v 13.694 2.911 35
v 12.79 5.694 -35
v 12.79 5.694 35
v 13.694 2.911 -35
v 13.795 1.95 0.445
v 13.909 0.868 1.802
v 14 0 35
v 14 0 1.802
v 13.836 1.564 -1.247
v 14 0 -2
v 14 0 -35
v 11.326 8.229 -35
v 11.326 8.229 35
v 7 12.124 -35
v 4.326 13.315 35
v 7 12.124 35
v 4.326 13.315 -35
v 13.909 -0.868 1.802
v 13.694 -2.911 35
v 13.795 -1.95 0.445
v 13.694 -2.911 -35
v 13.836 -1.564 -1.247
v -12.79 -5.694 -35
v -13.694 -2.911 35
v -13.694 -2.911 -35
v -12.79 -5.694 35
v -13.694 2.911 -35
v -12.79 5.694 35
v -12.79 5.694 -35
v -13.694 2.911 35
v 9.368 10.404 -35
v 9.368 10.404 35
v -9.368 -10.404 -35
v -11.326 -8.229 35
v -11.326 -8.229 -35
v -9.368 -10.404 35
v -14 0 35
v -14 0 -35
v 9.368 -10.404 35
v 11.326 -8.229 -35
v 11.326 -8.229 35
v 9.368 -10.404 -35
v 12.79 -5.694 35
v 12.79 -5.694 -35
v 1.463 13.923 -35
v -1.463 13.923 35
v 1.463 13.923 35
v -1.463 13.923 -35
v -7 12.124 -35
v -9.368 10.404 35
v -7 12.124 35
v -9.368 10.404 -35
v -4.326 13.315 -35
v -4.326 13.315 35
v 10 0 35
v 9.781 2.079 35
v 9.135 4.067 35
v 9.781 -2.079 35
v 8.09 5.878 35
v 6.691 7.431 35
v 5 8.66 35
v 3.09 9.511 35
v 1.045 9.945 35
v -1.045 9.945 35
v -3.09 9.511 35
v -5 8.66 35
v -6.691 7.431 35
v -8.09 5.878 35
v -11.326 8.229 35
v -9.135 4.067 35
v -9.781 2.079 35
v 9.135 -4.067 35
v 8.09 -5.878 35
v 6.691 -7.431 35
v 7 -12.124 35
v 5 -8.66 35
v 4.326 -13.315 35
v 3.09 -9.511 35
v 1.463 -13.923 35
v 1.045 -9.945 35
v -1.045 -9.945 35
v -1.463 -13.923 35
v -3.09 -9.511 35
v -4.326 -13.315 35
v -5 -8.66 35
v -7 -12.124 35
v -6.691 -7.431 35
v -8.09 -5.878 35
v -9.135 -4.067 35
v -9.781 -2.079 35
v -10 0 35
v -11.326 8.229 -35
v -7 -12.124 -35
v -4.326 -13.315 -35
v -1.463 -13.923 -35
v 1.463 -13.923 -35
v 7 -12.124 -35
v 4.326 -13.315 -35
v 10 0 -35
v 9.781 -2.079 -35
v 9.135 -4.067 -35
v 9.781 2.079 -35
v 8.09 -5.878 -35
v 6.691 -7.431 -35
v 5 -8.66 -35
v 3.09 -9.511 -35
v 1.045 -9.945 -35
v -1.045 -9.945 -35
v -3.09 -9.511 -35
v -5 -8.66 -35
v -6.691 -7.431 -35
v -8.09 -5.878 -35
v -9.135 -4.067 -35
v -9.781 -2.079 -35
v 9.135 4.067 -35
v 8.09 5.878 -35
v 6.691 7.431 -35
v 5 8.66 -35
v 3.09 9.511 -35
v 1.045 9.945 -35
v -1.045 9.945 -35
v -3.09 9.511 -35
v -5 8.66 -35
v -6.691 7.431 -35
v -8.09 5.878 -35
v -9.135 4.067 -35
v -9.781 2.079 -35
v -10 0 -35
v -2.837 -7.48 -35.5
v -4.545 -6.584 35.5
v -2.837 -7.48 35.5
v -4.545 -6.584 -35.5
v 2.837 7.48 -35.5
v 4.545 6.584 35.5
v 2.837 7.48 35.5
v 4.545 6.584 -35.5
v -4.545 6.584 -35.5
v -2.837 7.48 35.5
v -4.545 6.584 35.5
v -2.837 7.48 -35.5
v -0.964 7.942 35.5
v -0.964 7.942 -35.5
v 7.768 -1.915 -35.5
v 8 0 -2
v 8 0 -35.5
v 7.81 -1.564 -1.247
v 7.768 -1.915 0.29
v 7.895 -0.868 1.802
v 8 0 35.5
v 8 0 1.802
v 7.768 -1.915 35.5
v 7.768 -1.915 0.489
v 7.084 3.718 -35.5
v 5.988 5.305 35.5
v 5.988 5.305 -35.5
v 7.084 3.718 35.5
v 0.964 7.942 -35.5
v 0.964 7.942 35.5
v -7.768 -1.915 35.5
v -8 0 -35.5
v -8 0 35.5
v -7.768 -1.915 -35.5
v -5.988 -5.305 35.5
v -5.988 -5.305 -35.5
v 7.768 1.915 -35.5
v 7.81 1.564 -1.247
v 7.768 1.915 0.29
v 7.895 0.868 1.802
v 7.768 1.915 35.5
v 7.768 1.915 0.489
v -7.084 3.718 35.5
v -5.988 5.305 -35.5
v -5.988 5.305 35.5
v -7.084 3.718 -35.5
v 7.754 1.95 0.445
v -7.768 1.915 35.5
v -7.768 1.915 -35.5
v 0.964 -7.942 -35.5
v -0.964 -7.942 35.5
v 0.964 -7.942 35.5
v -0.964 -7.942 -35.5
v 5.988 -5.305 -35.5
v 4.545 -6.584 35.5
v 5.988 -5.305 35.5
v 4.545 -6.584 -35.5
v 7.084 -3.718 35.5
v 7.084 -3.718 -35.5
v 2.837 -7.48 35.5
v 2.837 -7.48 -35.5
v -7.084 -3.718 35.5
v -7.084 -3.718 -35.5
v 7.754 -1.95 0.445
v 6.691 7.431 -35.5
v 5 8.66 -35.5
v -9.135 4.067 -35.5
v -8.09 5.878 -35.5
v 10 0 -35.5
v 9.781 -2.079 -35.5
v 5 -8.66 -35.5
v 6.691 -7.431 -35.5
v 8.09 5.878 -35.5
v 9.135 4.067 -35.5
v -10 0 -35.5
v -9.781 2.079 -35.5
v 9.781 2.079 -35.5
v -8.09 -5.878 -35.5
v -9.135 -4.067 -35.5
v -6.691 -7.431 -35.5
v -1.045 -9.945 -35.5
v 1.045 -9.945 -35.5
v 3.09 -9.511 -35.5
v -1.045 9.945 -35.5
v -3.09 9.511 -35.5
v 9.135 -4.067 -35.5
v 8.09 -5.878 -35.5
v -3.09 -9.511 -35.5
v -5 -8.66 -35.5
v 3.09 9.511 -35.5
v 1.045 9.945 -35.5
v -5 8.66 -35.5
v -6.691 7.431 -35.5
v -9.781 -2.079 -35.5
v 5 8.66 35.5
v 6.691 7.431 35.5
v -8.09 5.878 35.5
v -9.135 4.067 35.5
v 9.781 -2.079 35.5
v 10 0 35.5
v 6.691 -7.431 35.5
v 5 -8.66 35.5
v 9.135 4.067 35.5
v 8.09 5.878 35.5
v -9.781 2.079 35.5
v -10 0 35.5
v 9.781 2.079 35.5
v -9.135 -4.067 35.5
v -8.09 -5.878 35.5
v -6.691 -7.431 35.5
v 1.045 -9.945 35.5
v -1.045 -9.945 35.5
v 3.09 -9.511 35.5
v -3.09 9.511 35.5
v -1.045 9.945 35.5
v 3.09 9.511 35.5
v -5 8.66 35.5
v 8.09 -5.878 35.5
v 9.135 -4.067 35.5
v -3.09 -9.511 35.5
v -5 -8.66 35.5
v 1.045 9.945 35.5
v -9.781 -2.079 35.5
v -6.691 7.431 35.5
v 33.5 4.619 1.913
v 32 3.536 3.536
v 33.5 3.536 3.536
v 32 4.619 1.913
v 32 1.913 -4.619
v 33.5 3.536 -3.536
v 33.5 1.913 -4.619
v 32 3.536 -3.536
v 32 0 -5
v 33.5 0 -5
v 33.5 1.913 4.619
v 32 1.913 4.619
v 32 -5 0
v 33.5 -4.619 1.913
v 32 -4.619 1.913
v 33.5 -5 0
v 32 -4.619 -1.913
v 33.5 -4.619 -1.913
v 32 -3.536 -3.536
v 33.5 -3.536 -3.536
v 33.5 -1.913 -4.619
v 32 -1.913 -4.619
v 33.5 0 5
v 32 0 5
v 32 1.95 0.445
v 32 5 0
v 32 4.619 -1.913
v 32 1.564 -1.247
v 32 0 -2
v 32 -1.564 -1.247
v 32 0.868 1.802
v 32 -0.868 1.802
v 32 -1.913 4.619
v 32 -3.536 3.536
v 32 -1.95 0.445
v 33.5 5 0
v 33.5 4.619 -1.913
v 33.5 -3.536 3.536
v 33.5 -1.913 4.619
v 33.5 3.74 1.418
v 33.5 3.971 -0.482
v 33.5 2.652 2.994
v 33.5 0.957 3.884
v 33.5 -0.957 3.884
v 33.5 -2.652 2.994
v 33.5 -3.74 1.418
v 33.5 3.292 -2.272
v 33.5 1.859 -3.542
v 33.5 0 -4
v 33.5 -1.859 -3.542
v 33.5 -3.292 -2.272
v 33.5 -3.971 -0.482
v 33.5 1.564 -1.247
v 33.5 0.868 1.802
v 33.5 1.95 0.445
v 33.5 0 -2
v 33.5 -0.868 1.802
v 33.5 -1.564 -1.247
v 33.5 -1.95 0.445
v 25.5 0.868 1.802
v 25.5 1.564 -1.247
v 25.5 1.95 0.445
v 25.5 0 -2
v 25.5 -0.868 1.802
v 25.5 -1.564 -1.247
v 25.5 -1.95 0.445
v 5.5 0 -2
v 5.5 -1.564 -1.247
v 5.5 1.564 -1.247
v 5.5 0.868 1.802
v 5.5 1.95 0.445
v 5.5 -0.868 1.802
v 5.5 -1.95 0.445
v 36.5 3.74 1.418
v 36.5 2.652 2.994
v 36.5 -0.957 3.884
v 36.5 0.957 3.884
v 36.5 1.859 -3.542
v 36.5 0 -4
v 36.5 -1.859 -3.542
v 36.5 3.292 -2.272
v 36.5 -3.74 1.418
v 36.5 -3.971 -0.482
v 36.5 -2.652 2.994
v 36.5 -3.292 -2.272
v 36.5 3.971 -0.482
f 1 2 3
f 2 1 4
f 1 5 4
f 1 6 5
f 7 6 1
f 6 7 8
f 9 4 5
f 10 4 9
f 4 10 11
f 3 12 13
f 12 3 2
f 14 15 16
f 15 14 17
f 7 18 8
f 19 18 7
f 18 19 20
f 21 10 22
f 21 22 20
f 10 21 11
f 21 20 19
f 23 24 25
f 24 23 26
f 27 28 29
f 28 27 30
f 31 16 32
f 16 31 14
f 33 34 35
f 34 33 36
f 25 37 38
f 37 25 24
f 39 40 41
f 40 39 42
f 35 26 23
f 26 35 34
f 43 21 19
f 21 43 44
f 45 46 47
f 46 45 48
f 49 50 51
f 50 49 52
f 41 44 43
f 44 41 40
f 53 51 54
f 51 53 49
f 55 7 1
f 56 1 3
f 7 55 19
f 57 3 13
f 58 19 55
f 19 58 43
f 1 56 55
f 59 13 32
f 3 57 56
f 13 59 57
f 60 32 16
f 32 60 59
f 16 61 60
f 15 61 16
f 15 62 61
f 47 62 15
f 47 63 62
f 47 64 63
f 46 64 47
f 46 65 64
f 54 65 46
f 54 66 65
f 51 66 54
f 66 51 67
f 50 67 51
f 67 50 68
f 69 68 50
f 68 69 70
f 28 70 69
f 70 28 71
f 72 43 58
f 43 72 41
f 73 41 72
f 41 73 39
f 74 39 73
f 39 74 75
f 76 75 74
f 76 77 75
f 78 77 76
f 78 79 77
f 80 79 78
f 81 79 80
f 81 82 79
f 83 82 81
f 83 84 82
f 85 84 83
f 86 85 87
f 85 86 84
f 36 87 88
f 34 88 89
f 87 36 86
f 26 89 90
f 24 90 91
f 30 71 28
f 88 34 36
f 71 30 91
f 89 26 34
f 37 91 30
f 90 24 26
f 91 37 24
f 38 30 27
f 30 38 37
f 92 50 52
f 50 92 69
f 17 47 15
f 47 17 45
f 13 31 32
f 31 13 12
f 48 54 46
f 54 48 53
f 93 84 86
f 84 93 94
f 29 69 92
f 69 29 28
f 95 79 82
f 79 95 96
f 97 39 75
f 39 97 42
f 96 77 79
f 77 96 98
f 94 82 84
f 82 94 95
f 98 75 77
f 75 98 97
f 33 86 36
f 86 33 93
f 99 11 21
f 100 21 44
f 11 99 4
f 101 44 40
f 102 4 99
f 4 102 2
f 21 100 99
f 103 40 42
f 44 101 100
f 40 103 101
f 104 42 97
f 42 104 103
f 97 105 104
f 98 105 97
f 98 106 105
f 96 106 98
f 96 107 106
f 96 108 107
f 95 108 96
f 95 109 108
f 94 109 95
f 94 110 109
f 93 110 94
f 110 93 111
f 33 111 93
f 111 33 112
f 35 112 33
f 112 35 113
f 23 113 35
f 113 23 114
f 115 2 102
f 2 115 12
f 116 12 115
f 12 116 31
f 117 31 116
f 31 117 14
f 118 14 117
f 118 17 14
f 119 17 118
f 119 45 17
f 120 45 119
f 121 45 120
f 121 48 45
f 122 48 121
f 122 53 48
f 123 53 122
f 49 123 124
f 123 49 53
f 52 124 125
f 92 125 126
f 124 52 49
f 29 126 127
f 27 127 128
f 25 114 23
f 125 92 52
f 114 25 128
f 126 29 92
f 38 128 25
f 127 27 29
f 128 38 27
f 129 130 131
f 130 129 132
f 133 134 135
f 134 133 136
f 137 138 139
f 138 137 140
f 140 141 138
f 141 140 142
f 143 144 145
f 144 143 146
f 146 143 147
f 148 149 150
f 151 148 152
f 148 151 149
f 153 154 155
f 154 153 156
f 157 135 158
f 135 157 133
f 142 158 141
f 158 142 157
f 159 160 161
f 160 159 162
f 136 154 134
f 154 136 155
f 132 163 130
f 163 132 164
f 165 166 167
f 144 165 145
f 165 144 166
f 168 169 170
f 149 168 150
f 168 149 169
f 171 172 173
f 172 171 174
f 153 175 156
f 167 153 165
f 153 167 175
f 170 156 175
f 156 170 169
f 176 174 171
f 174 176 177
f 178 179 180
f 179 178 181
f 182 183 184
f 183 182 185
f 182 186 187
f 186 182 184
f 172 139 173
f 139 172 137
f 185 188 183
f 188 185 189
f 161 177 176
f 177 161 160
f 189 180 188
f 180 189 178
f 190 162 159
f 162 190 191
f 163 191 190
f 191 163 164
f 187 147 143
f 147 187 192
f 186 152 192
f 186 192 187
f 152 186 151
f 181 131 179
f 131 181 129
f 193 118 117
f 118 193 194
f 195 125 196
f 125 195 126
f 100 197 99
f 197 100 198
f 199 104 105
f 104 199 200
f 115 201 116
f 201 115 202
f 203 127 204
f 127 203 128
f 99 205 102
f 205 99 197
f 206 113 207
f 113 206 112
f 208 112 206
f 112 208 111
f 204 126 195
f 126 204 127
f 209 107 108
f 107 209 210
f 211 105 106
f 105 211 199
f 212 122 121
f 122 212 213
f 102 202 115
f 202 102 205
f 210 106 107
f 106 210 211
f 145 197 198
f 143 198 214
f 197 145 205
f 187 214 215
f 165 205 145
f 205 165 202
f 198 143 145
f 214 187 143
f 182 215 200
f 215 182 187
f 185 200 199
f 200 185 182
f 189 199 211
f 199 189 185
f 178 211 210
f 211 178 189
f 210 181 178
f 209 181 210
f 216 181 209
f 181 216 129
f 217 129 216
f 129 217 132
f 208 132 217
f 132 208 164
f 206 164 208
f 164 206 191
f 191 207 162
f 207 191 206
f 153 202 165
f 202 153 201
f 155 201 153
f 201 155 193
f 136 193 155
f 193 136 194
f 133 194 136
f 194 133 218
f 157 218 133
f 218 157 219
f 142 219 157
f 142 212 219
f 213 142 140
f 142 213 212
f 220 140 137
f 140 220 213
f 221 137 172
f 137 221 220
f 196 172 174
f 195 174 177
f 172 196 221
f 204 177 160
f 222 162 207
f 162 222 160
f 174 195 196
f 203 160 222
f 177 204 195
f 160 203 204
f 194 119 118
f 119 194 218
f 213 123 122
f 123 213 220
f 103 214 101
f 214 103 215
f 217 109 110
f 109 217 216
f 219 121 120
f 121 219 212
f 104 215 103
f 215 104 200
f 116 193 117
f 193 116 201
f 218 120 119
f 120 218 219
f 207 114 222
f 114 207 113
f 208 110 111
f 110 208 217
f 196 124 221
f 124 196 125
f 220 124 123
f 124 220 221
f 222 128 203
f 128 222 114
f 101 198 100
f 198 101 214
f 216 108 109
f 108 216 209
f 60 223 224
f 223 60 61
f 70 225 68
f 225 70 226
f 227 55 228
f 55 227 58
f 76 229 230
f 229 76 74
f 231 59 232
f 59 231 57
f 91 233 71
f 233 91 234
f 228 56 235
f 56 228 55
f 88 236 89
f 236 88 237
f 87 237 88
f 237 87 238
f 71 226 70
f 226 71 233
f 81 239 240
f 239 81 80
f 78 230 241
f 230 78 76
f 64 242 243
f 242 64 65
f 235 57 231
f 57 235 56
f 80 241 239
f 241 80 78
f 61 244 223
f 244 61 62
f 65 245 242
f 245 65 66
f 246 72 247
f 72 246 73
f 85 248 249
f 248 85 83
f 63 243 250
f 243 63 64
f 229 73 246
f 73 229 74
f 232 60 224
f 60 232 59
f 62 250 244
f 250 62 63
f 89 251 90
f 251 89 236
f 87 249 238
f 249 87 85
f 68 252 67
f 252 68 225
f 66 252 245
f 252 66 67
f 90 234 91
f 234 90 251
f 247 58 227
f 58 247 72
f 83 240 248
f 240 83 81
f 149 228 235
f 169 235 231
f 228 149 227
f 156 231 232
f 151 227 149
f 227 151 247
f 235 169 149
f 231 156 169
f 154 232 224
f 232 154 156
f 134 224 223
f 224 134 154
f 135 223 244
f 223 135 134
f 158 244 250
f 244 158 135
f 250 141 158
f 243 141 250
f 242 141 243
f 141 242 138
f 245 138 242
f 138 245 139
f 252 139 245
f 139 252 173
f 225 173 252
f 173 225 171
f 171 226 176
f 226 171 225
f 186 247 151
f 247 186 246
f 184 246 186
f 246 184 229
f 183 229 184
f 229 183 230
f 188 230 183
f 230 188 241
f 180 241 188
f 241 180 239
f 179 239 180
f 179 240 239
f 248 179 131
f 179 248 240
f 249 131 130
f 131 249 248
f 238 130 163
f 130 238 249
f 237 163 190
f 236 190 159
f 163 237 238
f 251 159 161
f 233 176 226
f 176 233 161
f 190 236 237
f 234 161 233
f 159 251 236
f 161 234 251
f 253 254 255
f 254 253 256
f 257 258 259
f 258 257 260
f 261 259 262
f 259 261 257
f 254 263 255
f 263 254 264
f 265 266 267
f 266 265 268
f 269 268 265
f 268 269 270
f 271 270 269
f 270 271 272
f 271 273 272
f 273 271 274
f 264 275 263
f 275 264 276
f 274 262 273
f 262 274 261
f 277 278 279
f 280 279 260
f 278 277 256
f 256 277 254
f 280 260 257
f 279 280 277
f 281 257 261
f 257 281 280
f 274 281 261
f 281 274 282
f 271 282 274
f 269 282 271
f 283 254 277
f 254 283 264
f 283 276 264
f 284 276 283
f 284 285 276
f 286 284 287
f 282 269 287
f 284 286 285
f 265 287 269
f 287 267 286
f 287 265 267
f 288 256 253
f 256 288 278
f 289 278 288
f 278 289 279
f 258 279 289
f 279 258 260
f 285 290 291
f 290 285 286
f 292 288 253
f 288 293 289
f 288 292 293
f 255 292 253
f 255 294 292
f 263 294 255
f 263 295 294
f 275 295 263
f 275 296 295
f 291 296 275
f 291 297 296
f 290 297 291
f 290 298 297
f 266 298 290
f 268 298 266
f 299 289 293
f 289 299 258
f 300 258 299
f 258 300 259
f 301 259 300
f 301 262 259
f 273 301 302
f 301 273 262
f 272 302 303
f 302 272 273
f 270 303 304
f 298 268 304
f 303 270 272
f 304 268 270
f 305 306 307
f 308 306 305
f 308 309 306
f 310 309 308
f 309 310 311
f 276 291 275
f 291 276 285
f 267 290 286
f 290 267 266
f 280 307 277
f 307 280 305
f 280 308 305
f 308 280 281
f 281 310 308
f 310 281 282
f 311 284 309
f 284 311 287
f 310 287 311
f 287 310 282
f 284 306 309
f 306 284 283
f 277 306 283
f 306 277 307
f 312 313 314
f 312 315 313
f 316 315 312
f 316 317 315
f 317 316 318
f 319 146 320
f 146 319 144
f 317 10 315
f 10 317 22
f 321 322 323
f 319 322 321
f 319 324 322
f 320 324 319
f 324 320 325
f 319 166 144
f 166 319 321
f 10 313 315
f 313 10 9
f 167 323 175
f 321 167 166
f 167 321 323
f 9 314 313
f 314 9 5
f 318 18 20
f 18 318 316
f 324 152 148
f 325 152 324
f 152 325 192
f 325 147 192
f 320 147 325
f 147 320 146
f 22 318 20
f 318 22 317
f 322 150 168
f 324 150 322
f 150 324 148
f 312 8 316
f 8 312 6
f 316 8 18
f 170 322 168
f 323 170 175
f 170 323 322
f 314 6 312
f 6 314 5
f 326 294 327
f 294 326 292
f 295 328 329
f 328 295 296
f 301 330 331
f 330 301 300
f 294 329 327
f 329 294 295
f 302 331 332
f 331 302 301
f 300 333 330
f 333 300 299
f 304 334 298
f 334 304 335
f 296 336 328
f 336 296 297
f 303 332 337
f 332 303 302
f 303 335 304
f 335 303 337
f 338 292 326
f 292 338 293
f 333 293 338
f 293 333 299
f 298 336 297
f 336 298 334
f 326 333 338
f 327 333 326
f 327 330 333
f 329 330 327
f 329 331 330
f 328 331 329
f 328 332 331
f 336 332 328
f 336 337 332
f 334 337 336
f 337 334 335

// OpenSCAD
// Parameters
bore_diameter_mm = 16; //[8:32:0.5]
outer_diameter_mm = 28; //[14:56:0.5]
length_mm = 70; //[35:140:1]
wall_thickness_mm = 6; //[3:12:0.5]
centered = 1; //[0:1:1]
has_external_grooves = 0; //[0:1:1]
groove_diameter_mm = 26; //[20:27.5:0.5]
groove_length_mm = 3; //[1:10:0.5]
groove_spacing_mm = 50; //[20:120:1]
seal_thickness_mm = 2; //[1:5:0.5]
seal_radial_thickness_mm = 2; //[1:5:0.5]
eps_mm = 0.5; //[0.2:2:0.1]
screw_shank_diameter_mm = 4; //[2:8:0.5]
screw_length_mm = 20; //[10:60:1]
screw_head_diameter_mm = 8; //[4:16:0.5]
screw_head_height_mm = 3; //[1.5:8:0.5]
washer_outer_diameter_mm = 10; //[6:24:0.5]
washer_thickness_mm = 1.5; //[0.8:4:0.1]

// Linear Bearing - complete geometry
module linear_bearing() {
  color("DimGray") {
    // Outer casing
    difference() {
      cylinder(h=length_mm, r=outer_diameter_mm/2, center=true);
      // Inner bore
      translate([0, 0, 0])
        cylinder(h=length_mm + 2*eps_mm, r=bore_diameter_mm/2, center=true);
    }
    // End seals
    union() {
      // Left seal
      translate([0, 0, -length_mm/2 + seal_thickness_mm/2 - eps_mm])
        difference() {
          cylinder(h=seal_thickness_mm, r=bore_diameter_mm/2 + seal_radial_thickness_mm, center=true);
          cylinder(h=seal_thickness_mm + 2*eps_mm, r=bore_diameter_mm/2, center=true);
        }
      // Right seal
      translate([0, 0, length_mm/2 - seal_thickness_mm/2 + eps_mm])
        difference() {
          cylinder(h=seal_thickness_mm, r=bore_diameter_mm/2 + seal_radial_thickness_mm, center=true);
          cylinder(h=seal_thickness_mm + 2*eps_mm, r=bore_diameter_mm/2, center=true);
        }
    }
    // Optional grooves
    if (has_external_grooves) {
      difference() {
        // Left groove
        translate([0, 0, -groove_spacing_mm/2])
          difference() {
            cylinder(h=groove_length_mm, r=outer_diameter_mm/2, center=true);
            cylinder(h=groove_length_mm + 2*eps_mm, r=groove_diameter_mm/2, center=true);
          }
        // Right groove
        translate([0, 0, groove_spacing_mm/2])
          difference() {
            cylinder(h=groove_length_mm, r=outer_diameter_mm/2, center=true);
            cylinder(h=groove_length_mm + 2*eps_mm, r=groove_diameter_mm/2, center=true);
          }
      }
    }
  }
}

// Screw and Washer - complete geometry
module screw_and_washer() {
  color("Silver") {
    // Screw shank
    translate([outer_diameter_mm/2 + screw_shank_diameter_mm/2 - eps_mm, 0, 0])
      rotate([0, 90, 0])
      cylinder(h=screw_length_mm, r=screw_shank_diameter_mm/2, center=true);
    // Screw head
    translate([outer_diameter_mm/2 + screw_length_mm + screw_head_height_mm/2 - eps_mm, 0, 0])
      rotate([0, 90, 0])
      cylinder(h=screw_head_height_mm, r=screw_head_diameter_mm/2, center=true);
    // Washer
    translate([outer_diameter_mm/2 + screw_length_mm - washer_thickness_mm/2 - eps_mm, 0, 0])
      rotate([0, 90, 0])
      difference() {
        cylinder(h=washer_thickness_mm, r=washer_outer_diameter_mm/2, center=true);
        cylinder(h=washer_thickness_mm + 2*eps_mm, r=screw_shank_diameter_mm/2, center=true);
      }
  }
}

// Assembly
module assembly() {
  linear_bearing();
  screw_and_washer();
}

assembly();
